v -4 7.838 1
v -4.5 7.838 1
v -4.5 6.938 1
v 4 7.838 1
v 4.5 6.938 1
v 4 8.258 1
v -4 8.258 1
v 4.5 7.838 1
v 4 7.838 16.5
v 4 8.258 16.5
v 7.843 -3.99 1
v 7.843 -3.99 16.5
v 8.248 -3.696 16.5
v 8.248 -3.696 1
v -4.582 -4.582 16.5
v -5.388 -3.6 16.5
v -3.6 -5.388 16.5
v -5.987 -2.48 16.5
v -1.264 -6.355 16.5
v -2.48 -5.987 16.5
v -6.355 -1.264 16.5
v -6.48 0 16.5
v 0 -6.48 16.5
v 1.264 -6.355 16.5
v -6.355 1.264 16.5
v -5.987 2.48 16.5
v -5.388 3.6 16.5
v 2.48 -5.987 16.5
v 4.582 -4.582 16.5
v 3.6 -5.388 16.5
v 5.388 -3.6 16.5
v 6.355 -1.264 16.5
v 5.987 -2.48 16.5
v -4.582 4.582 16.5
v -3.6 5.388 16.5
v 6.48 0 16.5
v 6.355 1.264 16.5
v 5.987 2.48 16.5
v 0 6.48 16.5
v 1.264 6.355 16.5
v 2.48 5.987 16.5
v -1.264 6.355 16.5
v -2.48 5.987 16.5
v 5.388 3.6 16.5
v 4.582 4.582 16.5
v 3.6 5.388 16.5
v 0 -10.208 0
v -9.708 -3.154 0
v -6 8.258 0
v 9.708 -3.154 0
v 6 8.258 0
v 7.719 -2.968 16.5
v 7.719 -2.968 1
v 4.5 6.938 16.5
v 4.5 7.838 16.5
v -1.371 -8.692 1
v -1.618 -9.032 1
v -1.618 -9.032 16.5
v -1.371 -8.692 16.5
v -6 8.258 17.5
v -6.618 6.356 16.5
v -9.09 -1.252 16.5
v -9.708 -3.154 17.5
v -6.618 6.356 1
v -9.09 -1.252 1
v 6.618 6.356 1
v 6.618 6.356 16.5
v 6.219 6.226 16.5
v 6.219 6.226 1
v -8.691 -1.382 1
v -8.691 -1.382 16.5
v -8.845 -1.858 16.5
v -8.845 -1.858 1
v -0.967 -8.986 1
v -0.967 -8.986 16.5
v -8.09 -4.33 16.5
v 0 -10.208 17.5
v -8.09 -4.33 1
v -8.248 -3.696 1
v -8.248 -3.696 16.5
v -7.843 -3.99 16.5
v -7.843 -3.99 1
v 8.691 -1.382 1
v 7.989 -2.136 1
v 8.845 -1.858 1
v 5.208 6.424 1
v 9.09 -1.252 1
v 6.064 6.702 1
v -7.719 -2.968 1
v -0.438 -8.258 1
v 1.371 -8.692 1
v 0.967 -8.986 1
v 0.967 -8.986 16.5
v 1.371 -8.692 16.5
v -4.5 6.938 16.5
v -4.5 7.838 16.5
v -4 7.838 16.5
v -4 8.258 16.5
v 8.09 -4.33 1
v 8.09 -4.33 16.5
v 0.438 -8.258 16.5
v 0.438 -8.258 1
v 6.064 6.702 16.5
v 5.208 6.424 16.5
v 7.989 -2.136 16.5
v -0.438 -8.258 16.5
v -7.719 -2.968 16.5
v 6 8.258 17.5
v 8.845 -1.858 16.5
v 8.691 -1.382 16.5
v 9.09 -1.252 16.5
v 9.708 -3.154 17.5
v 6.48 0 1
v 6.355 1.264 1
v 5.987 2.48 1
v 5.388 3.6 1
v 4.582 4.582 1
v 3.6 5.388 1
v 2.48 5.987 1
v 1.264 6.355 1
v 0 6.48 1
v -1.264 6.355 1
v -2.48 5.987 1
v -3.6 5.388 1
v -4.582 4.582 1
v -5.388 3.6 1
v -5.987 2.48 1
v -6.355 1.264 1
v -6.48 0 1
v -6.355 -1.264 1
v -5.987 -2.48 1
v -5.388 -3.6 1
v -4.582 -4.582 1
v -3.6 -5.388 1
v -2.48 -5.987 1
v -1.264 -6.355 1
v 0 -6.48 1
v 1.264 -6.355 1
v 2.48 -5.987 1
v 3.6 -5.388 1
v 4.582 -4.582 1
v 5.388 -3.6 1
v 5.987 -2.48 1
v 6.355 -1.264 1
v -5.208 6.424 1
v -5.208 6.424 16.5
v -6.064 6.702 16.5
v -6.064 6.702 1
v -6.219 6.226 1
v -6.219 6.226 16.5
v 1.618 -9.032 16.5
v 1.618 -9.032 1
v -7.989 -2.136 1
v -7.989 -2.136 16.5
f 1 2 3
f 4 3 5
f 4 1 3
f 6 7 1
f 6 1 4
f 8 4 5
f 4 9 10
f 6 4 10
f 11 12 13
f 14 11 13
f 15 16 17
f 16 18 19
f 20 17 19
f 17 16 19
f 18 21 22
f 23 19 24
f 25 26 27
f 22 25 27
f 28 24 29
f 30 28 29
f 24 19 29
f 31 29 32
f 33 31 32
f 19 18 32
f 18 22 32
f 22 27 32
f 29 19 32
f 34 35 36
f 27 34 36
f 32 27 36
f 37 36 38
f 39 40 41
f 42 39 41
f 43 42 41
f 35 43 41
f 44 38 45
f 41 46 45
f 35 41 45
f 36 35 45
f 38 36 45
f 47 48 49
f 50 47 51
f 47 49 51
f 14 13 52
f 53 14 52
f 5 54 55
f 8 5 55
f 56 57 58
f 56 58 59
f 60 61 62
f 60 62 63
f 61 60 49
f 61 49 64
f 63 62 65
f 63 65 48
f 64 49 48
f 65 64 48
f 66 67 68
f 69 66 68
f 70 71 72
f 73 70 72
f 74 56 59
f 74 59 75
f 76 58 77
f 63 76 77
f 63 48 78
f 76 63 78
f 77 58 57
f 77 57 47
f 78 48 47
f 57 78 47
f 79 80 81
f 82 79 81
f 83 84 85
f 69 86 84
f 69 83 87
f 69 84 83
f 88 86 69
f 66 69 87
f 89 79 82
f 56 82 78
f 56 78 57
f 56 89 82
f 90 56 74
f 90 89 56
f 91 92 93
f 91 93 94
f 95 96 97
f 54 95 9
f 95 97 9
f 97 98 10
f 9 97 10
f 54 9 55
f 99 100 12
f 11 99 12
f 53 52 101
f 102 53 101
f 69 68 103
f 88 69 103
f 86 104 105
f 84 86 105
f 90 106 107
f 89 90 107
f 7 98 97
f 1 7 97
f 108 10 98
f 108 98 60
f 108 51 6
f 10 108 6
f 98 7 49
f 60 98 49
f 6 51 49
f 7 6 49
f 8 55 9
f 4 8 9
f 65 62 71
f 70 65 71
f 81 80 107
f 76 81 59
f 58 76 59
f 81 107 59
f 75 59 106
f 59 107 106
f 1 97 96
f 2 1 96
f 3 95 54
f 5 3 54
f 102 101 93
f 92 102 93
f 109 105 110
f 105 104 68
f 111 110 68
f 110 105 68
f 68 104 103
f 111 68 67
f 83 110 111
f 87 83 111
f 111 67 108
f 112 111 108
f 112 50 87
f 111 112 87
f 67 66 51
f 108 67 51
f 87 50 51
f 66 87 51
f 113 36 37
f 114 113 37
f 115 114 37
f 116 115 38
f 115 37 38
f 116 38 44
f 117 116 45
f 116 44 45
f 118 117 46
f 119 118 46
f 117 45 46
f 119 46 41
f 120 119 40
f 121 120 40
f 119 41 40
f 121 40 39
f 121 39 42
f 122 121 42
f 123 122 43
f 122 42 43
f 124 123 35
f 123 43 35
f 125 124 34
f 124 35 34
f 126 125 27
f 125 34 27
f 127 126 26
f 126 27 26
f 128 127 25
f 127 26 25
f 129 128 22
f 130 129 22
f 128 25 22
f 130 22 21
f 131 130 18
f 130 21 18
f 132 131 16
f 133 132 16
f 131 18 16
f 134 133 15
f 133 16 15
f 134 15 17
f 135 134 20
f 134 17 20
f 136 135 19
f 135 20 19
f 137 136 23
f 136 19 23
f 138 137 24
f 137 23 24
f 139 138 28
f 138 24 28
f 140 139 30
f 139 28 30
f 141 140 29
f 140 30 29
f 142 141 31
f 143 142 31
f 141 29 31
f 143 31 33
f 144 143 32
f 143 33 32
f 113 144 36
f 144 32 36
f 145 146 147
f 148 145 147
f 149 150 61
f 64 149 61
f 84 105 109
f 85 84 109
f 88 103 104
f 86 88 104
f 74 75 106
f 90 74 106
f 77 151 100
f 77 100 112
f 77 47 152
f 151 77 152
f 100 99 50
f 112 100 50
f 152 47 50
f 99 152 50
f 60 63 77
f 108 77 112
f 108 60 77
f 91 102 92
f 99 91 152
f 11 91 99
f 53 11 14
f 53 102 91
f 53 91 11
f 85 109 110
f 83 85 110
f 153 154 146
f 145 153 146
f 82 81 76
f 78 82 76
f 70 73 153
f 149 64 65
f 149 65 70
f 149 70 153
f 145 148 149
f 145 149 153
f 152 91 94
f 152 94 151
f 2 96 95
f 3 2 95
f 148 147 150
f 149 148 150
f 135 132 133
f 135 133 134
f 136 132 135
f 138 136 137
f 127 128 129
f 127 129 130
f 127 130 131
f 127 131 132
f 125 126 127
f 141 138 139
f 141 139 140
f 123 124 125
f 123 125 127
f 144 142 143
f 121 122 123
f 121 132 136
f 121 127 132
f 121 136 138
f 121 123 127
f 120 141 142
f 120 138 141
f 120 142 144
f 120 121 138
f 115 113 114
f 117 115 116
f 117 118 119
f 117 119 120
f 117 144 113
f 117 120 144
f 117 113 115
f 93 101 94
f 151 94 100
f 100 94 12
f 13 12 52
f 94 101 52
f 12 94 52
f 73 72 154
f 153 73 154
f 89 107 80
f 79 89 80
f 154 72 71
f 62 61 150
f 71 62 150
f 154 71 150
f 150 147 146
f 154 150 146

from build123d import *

# Parameters (mm, degrees)
F1_DEPTH = 16.5
F2_R     = 6.48
F3_DEPTH = 15.5
F5_DEPTH = 1
F6_DEPTH = 15.5


with BuildPart() as f1:
    # F0 (on Top) → F1 (new body)
    with BuildSketch(Plane.XY):
        Polygon((6, 8.2582915228), (-6, 8.2582915228), (-9.7082039325, -3.1543866727), (0, -10.2078097002), (9.7082039325, -3.1543866727), align=None)
    extrude(amount=F1_DEPTH)

    # F2 (on face) → F3 (cut)
    with BuildSketch(Plane.XY.offset(16.5)):
        Polygon((-7.8433001378, -3.9901700397), (-8.0901699437, -4.3299571773), (-1.6180339887, -9.0322391956), (-1.3711641828, -8.692452058), (-0.9666556856, -8.9863446841), (-0.4376489585, -8.2582293892), (-7.7188019079, -2.9681621186), (-8.247808635, -3.6962774135), align=None)
        Polygon((-6.6180339887, 6.3561784902), (-9.0901699437, -1.2522736401), (-8.6907262069, -1.3820607778), (-8.8452347041, -1.8575890359), (-7.9892838394, -2.1357043308), (-5.2081308901, 6.4238043158), (-6.0640817547, 6.7019196107), (-6.2185902519, 6.2263913526), align=None)
        Polygon((1.6180339887, -9.0322391956), (8.0901699437, -4.3299571773), (7.8433001378, -3.9901700397), (8.247808635, -3.6962774135), (7.7188019079, -2.9681621186), (0.4376489585, -8.2582293892), (0.9666556856, -8.9863446841), (1.3711641828, -8.692452058), align=None)
        Polygon((4, 8.2582915228), (-4, 8.2582915228), (-4, 7.8382915228), (-4.5, 7.8382915228), (-4.5, 6.9382915228), (4.5, 6.9382915228), (4.5, 7.8382915228), (4, 7.8382915228), align=None)
        Polygon((9.0901699437, -1.2522736401), (6.6180339887, 6.3561784902), (6.2185902519, 6.2263913526), (6.0640817547, 6.7019196107), (5.2081308901, 6.4238043158), (7.9892838394, -2.1357043308), (8.8452347041, -1.8575890359), (8.6907262069, -1.3820607778), align=None)
        Circle(F2_R)
    extrude(amount=-F3_DEPTH, mode=Mode.SUBTRACT)

    # F4 (on face) → F5 (join)
    with BuildSketch(Plane.XY.offset(16.5)):
        Polygon((6, 8.2582915228), (-6, 8.2582915228), (-9.7082039325, -3.1543866727), (0, -10.2078097002), (9.7082039325, -3.1543866727), align=None)
    extrude(amount=F5_DEPTH)

    # F2 (on face) → F6 (cut)
    with BuildSketch(Plane.XY.offset(16.5)):
        Polygon((-7.8433001378, -3.9901700397), (-8.0901699437, -4.3299571773), (-1.6180339887, -9.0322391956), (-1.3711641828, -8.692452058), (-0.9666556856, -8.9863446841), (-0.4376489585, -8.2582293892), (-7.7188019079, -2.9681621186), (-8.247808635, -3.6962774135), align=None)
        Polygon((-6.6180339887, 6.3561784902), (-9.0901699437, -1.2522736401), (-8.6907262069, -1.3820607778), (-8.8452347041, -1.8575890359), (-7.9892838394, -2.1357043308), (-5.2081308901, 6.4238043158), (-6.0640817547, 6.7019196107), (-6.2185902519, 6.2263913526), align=None)
        Polygon((1.6180339887, -9.0322391956), (8.0901699437, -4.3299571773), (7.8433001378, -3.9901700397), (8.247808635, -3.6962774135), (7.7188019079, -2.9681621186), (0.4376489585, -8.2582293892), (0.9666556856, -8.9863446841), (1.3711641828, -8.692452058), align=None)
        Polygon((4, 8.2582915228), (-4, 8.2582915228), (-4, 7.8382915228), (-4.5, 7.8382915228), (-4.5, 6.9382915228), (4.5, 6.9382915228), (4.5, 7.8382915228), (4, 7.8382915228), align=None)
        Polygon((9.0901699437, -1.2522736401), (6.6180339887, 6.3561784902), (6.2185902519, 6.2263913526), (6.0640817547, 6.7019196107), (5.2081308901, 6.4238043158), (7.9892838394, -2.1357043308), (8.8452347041, -1.8575890359), (8.6907262069, -1.3820607778), align=None)
        Circle(F2_R)
    extrude(amount=-F6_DEPTH, mode=Mode.SUBTRACT)


solid = f1.part
